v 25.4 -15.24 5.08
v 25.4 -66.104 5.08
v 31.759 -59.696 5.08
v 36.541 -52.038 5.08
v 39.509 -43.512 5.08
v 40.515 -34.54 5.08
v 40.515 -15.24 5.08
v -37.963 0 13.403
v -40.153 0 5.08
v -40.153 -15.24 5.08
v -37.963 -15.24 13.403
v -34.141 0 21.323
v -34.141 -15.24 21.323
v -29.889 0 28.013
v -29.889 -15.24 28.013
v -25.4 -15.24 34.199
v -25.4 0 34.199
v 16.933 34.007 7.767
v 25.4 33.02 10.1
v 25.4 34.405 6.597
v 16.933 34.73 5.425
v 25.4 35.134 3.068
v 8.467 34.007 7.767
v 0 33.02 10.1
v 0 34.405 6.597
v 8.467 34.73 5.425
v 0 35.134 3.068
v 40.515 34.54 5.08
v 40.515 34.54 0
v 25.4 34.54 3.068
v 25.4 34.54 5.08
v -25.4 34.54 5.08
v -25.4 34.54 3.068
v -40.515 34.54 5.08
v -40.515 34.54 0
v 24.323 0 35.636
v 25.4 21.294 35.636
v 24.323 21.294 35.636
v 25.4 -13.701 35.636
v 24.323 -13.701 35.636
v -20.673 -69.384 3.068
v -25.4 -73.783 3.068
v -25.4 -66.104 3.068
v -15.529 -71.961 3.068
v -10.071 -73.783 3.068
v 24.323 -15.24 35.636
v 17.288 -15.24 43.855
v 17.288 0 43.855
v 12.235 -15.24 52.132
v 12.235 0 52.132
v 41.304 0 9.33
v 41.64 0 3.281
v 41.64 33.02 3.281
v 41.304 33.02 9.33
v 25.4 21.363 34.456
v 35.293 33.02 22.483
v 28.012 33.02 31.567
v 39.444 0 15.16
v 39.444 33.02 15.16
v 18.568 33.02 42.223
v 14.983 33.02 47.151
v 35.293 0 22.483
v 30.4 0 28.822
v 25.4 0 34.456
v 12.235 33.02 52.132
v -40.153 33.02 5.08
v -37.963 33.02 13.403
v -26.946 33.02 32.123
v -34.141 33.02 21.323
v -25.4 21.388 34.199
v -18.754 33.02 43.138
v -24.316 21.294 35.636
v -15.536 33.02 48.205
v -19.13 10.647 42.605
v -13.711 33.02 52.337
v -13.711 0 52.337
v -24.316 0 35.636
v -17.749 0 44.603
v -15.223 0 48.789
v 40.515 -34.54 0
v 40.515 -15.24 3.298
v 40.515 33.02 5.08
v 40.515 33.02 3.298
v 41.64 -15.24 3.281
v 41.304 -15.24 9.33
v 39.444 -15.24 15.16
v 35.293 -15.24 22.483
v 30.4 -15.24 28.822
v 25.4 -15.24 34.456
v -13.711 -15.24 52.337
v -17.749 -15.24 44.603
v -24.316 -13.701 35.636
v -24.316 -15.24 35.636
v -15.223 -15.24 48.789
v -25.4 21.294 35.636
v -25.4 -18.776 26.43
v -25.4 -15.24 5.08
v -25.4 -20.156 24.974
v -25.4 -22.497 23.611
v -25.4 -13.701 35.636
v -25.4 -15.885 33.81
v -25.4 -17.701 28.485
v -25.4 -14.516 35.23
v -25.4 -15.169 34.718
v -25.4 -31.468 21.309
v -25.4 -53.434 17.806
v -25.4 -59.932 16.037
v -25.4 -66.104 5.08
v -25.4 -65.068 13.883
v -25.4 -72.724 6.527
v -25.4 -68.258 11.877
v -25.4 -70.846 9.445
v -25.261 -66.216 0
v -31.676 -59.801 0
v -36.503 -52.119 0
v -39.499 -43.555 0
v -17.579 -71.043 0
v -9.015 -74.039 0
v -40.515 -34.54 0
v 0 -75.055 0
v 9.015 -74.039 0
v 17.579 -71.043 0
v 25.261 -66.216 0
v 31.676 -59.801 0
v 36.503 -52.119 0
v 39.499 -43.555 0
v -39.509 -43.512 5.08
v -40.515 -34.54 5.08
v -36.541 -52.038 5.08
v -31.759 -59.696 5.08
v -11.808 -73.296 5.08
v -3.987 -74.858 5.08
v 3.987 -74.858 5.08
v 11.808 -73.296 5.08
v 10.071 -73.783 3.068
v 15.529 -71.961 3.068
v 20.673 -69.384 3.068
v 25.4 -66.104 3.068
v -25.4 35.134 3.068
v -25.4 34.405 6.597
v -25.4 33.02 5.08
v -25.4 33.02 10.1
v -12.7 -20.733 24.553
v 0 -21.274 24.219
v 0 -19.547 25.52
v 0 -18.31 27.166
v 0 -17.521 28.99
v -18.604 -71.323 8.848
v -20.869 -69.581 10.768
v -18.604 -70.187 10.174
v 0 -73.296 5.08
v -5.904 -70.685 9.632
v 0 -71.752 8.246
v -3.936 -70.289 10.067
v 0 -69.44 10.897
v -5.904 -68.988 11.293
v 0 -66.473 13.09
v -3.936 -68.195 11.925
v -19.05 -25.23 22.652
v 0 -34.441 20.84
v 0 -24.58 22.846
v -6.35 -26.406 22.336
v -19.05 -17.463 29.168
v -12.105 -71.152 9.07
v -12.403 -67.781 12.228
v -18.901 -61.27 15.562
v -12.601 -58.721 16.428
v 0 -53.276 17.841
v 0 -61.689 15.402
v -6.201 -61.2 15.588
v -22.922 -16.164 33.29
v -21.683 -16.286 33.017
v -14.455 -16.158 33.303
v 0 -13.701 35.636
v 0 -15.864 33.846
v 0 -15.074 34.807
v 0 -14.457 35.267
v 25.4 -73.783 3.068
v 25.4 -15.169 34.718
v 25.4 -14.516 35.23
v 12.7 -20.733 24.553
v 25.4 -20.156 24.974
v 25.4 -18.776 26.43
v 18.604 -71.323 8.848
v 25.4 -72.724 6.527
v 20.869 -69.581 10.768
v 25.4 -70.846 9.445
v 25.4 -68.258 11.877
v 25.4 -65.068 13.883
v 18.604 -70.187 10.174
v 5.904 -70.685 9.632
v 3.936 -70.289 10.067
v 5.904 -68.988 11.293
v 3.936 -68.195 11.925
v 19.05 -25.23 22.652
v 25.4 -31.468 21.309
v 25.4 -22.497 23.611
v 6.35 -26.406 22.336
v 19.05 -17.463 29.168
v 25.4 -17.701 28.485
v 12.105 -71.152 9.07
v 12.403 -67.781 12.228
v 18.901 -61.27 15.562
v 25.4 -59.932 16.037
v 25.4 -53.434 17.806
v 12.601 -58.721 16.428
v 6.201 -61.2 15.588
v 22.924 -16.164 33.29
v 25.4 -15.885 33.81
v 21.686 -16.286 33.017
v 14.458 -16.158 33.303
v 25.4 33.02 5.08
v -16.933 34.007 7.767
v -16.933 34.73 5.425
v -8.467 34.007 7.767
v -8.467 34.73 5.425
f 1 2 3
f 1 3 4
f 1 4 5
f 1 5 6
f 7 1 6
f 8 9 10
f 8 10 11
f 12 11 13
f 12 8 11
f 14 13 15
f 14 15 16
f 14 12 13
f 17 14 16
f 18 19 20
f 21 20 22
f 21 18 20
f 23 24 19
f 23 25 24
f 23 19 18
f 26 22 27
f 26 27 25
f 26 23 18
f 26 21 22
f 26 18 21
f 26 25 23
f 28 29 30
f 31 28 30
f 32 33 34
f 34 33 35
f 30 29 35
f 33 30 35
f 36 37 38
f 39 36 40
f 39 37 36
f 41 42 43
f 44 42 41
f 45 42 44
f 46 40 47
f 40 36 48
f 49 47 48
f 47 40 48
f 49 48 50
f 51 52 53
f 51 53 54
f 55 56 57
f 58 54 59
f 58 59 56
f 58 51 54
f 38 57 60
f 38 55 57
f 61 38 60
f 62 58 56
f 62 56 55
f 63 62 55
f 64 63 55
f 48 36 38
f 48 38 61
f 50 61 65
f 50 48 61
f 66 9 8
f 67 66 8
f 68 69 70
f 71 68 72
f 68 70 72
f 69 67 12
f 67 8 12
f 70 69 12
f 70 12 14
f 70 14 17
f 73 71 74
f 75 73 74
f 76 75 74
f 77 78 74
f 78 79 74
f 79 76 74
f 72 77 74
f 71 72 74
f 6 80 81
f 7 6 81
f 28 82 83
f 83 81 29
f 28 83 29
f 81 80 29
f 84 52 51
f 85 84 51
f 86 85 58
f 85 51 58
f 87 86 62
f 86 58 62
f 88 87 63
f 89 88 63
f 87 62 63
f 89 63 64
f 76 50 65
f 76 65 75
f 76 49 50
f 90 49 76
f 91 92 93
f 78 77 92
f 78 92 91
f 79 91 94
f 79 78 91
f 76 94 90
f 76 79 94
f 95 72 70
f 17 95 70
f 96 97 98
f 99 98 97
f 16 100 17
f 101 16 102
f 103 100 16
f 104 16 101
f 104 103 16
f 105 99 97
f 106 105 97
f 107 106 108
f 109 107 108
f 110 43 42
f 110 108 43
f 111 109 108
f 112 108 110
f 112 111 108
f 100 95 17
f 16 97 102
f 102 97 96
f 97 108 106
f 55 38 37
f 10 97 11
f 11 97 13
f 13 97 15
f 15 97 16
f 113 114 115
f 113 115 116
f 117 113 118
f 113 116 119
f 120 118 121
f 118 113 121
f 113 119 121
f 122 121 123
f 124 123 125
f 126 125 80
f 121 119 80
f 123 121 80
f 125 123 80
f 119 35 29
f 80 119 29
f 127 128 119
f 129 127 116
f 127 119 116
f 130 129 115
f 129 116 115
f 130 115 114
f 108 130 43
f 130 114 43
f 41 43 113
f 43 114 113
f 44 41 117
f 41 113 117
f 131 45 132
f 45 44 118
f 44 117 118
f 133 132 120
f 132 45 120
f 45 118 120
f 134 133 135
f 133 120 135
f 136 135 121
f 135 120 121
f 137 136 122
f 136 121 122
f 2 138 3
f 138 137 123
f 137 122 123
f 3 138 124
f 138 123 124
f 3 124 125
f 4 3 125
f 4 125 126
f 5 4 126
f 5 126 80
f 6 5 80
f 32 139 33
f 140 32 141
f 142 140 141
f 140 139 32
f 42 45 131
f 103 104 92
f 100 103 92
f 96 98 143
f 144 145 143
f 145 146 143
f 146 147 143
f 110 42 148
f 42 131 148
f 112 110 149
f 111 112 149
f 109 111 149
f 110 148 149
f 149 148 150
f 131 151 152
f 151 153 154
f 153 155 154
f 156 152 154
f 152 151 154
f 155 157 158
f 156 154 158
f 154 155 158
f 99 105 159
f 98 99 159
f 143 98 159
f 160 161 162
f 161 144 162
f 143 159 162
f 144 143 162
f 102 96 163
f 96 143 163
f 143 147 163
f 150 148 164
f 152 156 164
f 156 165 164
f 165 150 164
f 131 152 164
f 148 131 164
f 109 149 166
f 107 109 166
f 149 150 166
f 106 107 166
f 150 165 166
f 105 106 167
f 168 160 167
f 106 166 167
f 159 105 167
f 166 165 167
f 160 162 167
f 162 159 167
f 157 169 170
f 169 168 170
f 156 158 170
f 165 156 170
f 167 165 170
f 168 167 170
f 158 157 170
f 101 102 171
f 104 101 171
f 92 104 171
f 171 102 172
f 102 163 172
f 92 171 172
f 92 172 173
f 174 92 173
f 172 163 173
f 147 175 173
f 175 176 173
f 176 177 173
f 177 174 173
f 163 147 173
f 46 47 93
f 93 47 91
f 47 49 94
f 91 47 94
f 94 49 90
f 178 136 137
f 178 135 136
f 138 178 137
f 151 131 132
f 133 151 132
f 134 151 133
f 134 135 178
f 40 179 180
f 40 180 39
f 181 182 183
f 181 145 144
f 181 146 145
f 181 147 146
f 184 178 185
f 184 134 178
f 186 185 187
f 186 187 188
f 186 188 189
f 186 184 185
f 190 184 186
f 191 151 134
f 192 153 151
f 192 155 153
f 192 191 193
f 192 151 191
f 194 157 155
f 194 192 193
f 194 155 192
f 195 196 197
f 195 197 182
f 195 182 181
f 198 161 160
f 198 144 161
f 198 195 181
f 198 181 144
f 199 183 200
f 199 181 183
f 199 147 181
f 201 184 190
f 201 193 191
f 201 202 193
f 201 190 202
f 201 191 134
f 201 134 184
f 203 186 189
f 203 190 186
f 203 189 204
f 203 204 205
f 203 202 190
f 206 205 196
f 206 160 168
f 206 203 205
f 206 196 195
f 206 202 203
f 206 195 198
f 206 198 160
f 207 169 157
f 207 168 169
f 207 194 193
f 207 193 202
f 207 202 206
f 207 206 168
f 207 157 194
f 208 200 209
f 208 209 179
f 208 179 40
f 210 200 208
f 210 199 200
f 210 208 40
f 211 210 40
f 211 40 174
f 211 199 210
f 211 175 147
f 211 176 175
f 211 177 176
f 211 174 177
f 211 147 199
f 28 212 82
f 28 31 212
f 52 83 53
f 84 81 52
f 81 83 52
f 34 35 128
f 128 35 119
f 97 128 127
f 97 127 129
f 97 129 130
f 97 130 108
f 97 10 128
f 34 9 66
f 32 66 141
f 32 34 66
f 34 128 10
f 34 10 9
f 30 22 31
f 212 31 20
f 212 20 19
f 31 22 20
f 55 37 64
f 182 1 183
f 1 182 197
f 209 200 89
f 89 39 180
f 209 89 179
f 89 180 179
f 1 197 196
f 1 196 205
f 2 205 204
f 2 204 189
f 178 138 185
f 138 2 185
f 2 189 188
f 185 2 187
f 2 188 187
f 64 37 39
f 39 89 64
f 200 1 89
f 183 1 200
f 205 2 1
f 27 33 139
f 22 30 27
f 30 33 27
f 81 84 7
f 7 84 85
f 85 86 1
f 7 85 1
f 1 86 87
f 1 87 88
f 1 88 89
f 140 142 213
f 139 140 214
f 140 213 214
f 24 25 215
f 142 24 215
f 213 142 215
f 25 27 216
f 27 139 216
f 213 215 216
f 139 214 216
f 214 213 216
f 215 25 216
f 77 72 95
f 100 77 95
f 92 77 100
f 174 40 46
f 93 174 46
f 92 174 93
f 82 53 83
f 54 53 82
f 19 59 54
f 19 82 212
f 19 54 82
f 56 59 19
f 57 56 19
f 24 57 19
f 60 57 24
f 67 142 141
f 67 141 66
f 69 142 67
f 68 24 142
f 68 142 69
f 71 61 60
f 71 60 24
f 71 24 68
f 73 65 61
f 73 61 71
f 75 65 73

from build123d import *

# Parameters (mm, degrees)
F1_DEPTH = 5.08
F3_DEPTH = 25.4
F5_DEPTH = 33.02
F6_DEPTH = 15.24


with BuildPart() as f1:
    # F0 (on Top) → F1 (new body)
    with BuildSketch(Plane.XY):
        with BuildLine():
            Line((40.5150838196, 34.5398373902), (-40.5150838196, 34.5398373902))
            Line((-40.5150838196, 34.5398373902), (-40.5150838196, -34.5398373902))
            ThreePointArc((-40.5150838196, -34.5398373902), (0, 5.9752464294), (40.5150838196, -34.5398373902))
            Line((40.5150838196, -34.5398373902), (40.5150838196, 34.5398373902))
        make_face()
        with BuildLine():
            Line((40.5150838196, -34.5398373902), (-40.5150838196, -34.5398373902))
            ThreePointArc((-40.5150838196, -34.5398373902), (0, -75.0549212098), (40.5150838196, -34.5398373902))
        make_face()
        with BuildLine():
            ThreePointArc((40.5150838196, -34.5398373902), (0, 5.9752464294), (-40.5150838196, -34.5398373902))
            Line((-40.5150838196, -34.5398373902), (40.5150838196, -34.5398373902))
        make_face()
    extrude(amount=F1_DEPTH)

    # F2 (on Right) → F3 (join, symmetric)
    with BuildSketch(Plane.YZ):
        with BuildLine():
            add(Edge.make_bspline(
                [(-73.7831778799, 3.0678272283), (-70.6378319232, 22.3217949024), (-10.9266128412, 15.6811594859), (-18.1588420727, 33.9181525964), (-13.7011114068, 35.6362367988)],
                knots=[0.0191217668, 0.0191217668, 0.0191217668, 0.0191217668, 0.4018269316, 0.5919587241, 0.5919587241, 0.5919587241, 0.5919587241], degree=3))
            Line((-73.7831778799, 3.0678272283), (35.1335004454, 3.0678272283))
            add(Edge.make_bspline(
                [(30.7071413344, 14.3951700711), (32.9333158099, 10.6251919955), (34.7726278071, 6.8872618686), (35.1335004454, 3.0678272283)],
                knots=[22.7167068517, 22.7167068517, 22.7167068517, 22.7167068517, 35.3870772104, 35.3870772104, 35.3870772104, 35.3870772104], degree=3))
            add(Edge.make_bspline(
                [(-5.1760206943, 35.6362367988), (5.8640768802, 33.5861974627), (22.7244588555, 25.6392571161), (30.7071413344, 14.3951700711)],
                knots=[0.6706583551, 0.6706583551, 0.6706583551, 0.6706583551, 0.9080645562, 0.9080645562, 0.9080645562, 0.9080645562], degree=3))
            Line((-5.1760206943, 35.6362367988), (-13.7011114068, 35.6362367988))
        make_face()
        with BuildLine():
            Line((21.2935607223, 35.6362367988), (-5.1760206943, 35.6362367988))
            add(Edge.make_bspline(
                [(-5.1760206943, 35.6362367988), (5.8640768802, 33.5861974627), (22.7244588555, 25.6392571161), (30.7071413344, 14.3951700711)],
                knots=[0.6706583551, 0.6706583551, 0.6706583551, 0.6706583551, 0.9080645562, 0.9080645562, 0.9080645562, 0.9080645562], degree=3))
            add(Edge.make_bspline(
                [(21.2935607223, 35.6362367988), (21.4809592492, 28.0165751791), (26.7158331461, 21.154363714), (30.7071413344, 14.3951700711)],
                knots=[0, 0, 0, 0, 22.7167068517, 22.7167068517, 22.7167068517, 22.7167068517], degree=3))
        make_face()
    extrude(amount=F3_DEPTH, both=True)

    # F4 (on Front) → F5 (join)
    with BuildSketch(Plane.XZ):
        with BuildLine():
            add(Edge.make_bspline(
                [(-40.2236059308, 4.5178690925), (-38.8947765504, 16.0087846112), (-25.0619320783, 34.8989974455), (-15.2672747918, 47.4251347969), (-13.7114411046, 52.3374542614)],
                knots=[0, 0, 0, 0, 0.5679803837, 1, 1, 1, 1], degree=3))
            Line((-40.2236059308, 4.5178690925), (41.6402526972, 3.2805741205))
            add(Edge.make_bspline(
                [(41.6402526972, 3.2805741205), (42.7852350273, 15.8196156508), (23.6680326777, 36.0266209863), (15.1578339465, 45.9356905739), (12.2352372609, 52.131823212)],
                knots=[0, 0, 0, 0, 0.5715646471, 1, 1, 1, 1], degree=3))
            Line((12.2352372609, 52.131823212), (-13.7114411046, 52.3374542614))
        make_face()
    extrude(amount=-F5_DEPTH)

    # F6 (add): faces of the model
    f6_faces = [f1.faces().sort_by_distance(p)[0] for p in [
        (-30.9475525695, 0, 15.5197286926),
        (-0.4224029854, 0, 43.046373164),
        (31.8842501294, 0, 15.7413854747),
    ]]
    extrude(f6_faces, amount=F6_DEPTH)


solid = f1.part
